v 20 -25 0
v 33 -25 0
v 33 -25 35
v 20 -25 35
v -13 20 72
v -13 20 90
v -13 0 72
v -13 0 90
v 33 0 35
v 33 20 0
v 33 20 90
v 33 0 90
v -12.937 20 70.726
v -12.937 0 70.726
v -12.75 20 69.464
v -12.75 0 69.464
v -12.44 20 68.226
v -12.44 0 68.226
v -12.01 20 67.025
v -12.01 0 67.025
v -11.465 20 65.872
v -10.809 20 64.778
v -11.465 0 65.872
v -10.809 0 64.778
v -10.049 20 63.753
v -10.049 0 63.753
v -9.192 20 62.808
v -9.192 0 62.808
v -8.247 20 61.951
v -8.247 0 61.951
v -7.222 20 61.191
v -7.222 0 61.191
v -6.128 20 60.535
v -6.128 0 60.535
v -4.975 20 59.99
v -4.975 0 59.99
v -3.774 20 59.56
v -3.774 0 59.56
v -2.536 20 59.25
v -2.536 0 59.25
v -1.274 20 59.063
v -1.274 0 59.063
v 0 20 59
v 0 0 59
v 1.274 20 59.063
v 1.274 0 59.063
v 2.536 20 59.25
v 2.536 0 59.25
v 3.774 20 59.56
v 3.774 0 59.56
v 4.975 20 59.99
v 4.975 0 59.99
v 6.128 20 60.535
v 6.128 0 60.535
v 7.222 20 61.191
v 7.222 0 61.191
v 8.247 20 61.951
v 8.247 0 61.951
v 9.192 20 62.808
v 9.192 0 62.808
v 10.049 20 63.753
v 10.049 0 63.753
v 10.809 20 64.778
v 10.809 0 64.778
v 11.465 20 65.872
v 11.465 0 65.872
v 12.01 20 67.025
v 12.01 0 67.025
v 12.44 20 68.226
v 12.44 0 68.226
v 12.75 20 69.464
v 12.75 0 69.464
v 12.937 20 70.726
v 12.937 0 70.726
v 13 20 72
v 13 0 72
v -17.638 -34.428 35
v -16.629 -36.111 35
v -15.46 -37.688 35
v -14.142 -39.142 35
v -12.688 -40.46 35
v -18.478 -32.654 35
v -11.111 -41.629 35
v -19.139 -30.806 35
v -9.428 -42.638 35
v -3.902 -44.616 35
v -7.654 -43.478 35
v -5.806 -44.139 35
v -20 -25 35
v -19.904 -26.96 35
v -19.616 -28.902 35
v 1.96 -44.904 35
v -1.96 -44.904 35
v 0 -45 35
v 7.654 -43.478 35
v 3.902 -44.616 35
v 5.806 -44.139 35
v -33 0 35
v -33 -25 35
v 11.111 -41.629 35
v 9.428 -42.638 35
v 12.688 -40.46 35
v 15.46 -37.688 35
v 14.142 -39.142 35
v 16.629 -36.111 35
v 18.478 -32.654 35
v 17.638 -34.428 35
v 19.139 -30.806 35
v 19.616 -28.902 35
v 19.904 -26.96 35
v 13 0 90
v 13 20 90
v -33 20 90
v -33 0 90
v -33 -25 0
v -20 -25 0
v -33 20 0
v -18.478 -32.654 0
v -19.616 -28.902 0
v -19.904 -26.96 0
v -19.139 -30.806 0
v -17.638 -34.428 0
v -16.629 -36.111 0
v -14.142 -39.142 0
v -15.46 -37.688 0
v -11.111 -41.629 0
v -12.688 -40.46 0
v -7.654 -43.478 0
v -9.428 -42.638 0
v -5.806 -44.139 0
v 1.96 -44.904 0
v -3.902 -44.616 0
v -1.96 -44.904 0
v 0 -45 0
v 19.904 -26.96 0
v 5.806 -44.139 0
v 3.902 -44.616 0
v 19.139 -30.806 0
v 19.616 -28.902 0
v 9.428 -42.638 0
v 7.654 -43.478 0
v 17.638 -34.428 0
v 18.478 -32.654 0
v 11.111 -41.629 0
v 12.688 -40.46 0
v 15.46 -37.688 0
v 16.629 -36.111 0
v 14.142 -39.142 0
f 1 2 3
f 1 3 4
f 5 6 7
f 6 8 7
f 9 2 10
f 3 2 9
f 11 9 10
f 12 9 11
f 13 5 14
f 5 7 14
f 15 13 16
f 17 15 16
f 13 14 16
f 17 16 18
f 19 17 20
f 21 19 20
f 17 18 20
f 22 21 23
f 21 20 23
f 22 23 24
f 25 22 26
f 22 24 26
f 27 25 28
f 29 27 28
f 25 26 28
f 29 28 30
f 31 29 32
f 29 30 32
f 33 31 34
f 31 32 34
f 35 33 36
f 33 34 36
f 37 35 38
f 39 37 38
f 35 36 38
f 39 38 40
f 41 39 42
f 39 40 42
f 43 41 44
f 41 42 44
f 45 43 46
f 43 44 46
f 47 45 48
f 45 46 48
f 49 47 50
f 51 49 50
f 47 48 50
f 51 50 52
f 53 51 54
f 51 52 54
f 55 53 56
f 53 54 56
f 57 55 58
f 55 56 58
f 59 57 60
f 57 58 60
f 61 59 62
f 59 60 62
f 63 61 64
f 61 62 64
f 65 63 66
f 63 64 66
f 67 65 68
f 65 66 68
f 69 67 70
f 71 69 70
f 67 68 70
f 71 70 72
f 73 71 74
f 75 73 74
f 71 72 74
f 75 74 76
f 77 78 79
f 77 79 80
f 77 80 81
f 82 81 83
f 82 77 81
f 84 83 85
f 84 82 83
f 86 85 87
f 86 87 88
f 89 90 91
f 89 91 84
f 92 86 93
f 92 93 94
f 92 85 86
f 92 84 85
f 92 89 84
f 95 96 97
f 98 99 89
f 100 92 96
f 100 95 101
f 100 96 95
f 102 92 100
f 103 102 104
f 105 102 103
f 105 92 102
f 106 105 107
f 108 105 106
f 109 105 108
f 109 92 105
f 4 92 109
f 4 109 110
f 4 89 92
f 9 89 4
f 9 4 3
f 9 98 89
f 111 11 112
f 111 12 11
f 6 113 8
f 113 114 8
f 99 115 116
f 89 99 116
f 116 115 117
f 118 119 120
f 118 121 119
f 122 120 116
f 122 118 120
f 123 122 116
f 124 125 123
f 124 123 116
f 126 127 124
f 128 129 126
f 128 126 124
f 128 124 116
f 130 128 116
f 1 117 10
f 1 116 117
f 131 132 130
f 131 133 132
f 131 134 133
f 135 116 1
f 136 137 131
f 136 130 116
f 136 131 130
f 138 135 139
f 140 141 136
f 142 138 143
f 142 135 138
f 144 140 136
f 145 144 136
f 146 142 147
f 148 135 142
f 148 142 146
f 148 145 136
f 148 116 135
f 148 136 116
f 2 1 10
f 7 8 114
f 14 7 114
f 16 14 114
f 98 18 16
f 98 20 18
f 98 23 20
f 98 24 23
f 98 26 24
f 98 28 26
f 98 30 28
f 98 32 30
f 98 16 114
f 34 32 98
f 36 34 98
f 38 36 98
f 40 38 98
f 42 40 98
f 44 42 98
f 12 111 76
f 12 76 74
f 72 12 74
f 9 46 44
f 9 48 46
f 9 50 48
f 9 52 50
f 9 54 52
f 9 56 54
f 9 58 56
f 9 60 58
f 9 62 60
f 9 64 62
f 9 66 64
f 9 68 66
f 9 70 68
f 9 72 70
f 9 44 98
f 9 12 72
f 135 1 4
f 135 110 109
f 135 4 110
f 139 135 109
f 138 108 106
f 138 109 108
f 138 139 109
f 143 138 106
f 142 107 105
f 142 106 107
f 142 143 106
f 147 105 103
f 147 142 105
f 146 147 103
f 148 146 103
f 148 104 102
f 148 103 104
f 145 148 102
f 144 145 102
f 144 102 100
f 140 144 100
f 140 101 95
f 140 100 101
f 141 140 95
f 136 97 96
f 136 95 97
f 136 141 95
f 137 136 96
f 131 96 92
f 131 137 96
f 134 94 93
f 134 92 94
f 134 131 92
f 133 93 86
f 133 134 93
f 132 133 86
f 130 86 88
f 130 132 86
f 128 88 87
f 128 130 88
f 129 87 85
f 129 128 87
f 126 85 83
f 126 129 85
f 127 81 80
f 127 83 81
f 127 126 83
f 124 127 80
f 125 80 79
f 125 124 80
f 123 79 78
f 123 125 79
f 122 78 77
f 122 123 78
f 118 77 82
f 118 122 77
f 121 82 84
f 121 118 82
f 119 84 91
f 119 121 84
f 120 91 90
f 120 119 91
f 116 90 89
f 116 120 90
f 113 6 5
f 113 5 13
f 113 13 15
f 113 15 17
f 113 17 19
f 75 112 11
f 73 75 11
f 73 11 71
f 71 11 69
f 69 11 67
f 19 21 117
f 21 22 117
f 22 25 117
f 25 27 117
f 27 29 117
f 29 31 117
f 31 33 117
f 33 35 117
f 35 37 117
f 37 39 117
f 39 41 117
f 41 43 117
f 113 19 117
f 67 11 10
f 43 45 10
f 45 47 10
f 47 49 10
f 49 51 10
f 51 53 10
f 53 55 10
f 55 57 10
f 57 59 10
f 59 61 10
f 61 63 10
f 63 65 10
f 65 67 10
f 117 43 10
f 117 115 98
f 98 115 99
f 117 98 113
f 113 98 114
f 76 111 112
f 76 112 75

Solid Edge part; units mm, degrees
sketch "Sketch1" plane through (0, 0, 0) normal (0, -1, 0) x (1, 0, 0)
  line L0 (33, 0) -> (33, 90)
  line L1 (33, 90) -> (13, 90)
  line L2 (13, 90) -> (13, 72)
  arc A0 (-13, 72) -> (13, 72) centre (0, 72) ccw
  line L3 (-13, 90) -> (-13, 72)
  line L4 (-33, 90) -> (-13, 90)
  line L5 (-33, 0) -> (-33, 90)
  line L6 (0, 0) -> (-33, 0)
  line L7 (0, 0) -> (33, 0)
extrude "Protrusion1" add sketch "Sketch1" against normal blind 20
sketch "Sketch2" plane through (0, 0, 0) normal (0, 0, 1) x (1, 0, 0)
  line L0 (33, 0) -> (33, -25)
  line L1 (33, -25) -> (20, -25)
  arc A0 (-20, -25) -> (20, -25) centre (0, -25) ccw
  line L2 (-33, -25) -> (-20, -25)
  line L3 (-33, 0) -> (-33, -25)
extrude "ExtrudedProtrusion_2" add sketch "Sketch2" along normal blind 35 material side at (32.95, -12.5, 0)
